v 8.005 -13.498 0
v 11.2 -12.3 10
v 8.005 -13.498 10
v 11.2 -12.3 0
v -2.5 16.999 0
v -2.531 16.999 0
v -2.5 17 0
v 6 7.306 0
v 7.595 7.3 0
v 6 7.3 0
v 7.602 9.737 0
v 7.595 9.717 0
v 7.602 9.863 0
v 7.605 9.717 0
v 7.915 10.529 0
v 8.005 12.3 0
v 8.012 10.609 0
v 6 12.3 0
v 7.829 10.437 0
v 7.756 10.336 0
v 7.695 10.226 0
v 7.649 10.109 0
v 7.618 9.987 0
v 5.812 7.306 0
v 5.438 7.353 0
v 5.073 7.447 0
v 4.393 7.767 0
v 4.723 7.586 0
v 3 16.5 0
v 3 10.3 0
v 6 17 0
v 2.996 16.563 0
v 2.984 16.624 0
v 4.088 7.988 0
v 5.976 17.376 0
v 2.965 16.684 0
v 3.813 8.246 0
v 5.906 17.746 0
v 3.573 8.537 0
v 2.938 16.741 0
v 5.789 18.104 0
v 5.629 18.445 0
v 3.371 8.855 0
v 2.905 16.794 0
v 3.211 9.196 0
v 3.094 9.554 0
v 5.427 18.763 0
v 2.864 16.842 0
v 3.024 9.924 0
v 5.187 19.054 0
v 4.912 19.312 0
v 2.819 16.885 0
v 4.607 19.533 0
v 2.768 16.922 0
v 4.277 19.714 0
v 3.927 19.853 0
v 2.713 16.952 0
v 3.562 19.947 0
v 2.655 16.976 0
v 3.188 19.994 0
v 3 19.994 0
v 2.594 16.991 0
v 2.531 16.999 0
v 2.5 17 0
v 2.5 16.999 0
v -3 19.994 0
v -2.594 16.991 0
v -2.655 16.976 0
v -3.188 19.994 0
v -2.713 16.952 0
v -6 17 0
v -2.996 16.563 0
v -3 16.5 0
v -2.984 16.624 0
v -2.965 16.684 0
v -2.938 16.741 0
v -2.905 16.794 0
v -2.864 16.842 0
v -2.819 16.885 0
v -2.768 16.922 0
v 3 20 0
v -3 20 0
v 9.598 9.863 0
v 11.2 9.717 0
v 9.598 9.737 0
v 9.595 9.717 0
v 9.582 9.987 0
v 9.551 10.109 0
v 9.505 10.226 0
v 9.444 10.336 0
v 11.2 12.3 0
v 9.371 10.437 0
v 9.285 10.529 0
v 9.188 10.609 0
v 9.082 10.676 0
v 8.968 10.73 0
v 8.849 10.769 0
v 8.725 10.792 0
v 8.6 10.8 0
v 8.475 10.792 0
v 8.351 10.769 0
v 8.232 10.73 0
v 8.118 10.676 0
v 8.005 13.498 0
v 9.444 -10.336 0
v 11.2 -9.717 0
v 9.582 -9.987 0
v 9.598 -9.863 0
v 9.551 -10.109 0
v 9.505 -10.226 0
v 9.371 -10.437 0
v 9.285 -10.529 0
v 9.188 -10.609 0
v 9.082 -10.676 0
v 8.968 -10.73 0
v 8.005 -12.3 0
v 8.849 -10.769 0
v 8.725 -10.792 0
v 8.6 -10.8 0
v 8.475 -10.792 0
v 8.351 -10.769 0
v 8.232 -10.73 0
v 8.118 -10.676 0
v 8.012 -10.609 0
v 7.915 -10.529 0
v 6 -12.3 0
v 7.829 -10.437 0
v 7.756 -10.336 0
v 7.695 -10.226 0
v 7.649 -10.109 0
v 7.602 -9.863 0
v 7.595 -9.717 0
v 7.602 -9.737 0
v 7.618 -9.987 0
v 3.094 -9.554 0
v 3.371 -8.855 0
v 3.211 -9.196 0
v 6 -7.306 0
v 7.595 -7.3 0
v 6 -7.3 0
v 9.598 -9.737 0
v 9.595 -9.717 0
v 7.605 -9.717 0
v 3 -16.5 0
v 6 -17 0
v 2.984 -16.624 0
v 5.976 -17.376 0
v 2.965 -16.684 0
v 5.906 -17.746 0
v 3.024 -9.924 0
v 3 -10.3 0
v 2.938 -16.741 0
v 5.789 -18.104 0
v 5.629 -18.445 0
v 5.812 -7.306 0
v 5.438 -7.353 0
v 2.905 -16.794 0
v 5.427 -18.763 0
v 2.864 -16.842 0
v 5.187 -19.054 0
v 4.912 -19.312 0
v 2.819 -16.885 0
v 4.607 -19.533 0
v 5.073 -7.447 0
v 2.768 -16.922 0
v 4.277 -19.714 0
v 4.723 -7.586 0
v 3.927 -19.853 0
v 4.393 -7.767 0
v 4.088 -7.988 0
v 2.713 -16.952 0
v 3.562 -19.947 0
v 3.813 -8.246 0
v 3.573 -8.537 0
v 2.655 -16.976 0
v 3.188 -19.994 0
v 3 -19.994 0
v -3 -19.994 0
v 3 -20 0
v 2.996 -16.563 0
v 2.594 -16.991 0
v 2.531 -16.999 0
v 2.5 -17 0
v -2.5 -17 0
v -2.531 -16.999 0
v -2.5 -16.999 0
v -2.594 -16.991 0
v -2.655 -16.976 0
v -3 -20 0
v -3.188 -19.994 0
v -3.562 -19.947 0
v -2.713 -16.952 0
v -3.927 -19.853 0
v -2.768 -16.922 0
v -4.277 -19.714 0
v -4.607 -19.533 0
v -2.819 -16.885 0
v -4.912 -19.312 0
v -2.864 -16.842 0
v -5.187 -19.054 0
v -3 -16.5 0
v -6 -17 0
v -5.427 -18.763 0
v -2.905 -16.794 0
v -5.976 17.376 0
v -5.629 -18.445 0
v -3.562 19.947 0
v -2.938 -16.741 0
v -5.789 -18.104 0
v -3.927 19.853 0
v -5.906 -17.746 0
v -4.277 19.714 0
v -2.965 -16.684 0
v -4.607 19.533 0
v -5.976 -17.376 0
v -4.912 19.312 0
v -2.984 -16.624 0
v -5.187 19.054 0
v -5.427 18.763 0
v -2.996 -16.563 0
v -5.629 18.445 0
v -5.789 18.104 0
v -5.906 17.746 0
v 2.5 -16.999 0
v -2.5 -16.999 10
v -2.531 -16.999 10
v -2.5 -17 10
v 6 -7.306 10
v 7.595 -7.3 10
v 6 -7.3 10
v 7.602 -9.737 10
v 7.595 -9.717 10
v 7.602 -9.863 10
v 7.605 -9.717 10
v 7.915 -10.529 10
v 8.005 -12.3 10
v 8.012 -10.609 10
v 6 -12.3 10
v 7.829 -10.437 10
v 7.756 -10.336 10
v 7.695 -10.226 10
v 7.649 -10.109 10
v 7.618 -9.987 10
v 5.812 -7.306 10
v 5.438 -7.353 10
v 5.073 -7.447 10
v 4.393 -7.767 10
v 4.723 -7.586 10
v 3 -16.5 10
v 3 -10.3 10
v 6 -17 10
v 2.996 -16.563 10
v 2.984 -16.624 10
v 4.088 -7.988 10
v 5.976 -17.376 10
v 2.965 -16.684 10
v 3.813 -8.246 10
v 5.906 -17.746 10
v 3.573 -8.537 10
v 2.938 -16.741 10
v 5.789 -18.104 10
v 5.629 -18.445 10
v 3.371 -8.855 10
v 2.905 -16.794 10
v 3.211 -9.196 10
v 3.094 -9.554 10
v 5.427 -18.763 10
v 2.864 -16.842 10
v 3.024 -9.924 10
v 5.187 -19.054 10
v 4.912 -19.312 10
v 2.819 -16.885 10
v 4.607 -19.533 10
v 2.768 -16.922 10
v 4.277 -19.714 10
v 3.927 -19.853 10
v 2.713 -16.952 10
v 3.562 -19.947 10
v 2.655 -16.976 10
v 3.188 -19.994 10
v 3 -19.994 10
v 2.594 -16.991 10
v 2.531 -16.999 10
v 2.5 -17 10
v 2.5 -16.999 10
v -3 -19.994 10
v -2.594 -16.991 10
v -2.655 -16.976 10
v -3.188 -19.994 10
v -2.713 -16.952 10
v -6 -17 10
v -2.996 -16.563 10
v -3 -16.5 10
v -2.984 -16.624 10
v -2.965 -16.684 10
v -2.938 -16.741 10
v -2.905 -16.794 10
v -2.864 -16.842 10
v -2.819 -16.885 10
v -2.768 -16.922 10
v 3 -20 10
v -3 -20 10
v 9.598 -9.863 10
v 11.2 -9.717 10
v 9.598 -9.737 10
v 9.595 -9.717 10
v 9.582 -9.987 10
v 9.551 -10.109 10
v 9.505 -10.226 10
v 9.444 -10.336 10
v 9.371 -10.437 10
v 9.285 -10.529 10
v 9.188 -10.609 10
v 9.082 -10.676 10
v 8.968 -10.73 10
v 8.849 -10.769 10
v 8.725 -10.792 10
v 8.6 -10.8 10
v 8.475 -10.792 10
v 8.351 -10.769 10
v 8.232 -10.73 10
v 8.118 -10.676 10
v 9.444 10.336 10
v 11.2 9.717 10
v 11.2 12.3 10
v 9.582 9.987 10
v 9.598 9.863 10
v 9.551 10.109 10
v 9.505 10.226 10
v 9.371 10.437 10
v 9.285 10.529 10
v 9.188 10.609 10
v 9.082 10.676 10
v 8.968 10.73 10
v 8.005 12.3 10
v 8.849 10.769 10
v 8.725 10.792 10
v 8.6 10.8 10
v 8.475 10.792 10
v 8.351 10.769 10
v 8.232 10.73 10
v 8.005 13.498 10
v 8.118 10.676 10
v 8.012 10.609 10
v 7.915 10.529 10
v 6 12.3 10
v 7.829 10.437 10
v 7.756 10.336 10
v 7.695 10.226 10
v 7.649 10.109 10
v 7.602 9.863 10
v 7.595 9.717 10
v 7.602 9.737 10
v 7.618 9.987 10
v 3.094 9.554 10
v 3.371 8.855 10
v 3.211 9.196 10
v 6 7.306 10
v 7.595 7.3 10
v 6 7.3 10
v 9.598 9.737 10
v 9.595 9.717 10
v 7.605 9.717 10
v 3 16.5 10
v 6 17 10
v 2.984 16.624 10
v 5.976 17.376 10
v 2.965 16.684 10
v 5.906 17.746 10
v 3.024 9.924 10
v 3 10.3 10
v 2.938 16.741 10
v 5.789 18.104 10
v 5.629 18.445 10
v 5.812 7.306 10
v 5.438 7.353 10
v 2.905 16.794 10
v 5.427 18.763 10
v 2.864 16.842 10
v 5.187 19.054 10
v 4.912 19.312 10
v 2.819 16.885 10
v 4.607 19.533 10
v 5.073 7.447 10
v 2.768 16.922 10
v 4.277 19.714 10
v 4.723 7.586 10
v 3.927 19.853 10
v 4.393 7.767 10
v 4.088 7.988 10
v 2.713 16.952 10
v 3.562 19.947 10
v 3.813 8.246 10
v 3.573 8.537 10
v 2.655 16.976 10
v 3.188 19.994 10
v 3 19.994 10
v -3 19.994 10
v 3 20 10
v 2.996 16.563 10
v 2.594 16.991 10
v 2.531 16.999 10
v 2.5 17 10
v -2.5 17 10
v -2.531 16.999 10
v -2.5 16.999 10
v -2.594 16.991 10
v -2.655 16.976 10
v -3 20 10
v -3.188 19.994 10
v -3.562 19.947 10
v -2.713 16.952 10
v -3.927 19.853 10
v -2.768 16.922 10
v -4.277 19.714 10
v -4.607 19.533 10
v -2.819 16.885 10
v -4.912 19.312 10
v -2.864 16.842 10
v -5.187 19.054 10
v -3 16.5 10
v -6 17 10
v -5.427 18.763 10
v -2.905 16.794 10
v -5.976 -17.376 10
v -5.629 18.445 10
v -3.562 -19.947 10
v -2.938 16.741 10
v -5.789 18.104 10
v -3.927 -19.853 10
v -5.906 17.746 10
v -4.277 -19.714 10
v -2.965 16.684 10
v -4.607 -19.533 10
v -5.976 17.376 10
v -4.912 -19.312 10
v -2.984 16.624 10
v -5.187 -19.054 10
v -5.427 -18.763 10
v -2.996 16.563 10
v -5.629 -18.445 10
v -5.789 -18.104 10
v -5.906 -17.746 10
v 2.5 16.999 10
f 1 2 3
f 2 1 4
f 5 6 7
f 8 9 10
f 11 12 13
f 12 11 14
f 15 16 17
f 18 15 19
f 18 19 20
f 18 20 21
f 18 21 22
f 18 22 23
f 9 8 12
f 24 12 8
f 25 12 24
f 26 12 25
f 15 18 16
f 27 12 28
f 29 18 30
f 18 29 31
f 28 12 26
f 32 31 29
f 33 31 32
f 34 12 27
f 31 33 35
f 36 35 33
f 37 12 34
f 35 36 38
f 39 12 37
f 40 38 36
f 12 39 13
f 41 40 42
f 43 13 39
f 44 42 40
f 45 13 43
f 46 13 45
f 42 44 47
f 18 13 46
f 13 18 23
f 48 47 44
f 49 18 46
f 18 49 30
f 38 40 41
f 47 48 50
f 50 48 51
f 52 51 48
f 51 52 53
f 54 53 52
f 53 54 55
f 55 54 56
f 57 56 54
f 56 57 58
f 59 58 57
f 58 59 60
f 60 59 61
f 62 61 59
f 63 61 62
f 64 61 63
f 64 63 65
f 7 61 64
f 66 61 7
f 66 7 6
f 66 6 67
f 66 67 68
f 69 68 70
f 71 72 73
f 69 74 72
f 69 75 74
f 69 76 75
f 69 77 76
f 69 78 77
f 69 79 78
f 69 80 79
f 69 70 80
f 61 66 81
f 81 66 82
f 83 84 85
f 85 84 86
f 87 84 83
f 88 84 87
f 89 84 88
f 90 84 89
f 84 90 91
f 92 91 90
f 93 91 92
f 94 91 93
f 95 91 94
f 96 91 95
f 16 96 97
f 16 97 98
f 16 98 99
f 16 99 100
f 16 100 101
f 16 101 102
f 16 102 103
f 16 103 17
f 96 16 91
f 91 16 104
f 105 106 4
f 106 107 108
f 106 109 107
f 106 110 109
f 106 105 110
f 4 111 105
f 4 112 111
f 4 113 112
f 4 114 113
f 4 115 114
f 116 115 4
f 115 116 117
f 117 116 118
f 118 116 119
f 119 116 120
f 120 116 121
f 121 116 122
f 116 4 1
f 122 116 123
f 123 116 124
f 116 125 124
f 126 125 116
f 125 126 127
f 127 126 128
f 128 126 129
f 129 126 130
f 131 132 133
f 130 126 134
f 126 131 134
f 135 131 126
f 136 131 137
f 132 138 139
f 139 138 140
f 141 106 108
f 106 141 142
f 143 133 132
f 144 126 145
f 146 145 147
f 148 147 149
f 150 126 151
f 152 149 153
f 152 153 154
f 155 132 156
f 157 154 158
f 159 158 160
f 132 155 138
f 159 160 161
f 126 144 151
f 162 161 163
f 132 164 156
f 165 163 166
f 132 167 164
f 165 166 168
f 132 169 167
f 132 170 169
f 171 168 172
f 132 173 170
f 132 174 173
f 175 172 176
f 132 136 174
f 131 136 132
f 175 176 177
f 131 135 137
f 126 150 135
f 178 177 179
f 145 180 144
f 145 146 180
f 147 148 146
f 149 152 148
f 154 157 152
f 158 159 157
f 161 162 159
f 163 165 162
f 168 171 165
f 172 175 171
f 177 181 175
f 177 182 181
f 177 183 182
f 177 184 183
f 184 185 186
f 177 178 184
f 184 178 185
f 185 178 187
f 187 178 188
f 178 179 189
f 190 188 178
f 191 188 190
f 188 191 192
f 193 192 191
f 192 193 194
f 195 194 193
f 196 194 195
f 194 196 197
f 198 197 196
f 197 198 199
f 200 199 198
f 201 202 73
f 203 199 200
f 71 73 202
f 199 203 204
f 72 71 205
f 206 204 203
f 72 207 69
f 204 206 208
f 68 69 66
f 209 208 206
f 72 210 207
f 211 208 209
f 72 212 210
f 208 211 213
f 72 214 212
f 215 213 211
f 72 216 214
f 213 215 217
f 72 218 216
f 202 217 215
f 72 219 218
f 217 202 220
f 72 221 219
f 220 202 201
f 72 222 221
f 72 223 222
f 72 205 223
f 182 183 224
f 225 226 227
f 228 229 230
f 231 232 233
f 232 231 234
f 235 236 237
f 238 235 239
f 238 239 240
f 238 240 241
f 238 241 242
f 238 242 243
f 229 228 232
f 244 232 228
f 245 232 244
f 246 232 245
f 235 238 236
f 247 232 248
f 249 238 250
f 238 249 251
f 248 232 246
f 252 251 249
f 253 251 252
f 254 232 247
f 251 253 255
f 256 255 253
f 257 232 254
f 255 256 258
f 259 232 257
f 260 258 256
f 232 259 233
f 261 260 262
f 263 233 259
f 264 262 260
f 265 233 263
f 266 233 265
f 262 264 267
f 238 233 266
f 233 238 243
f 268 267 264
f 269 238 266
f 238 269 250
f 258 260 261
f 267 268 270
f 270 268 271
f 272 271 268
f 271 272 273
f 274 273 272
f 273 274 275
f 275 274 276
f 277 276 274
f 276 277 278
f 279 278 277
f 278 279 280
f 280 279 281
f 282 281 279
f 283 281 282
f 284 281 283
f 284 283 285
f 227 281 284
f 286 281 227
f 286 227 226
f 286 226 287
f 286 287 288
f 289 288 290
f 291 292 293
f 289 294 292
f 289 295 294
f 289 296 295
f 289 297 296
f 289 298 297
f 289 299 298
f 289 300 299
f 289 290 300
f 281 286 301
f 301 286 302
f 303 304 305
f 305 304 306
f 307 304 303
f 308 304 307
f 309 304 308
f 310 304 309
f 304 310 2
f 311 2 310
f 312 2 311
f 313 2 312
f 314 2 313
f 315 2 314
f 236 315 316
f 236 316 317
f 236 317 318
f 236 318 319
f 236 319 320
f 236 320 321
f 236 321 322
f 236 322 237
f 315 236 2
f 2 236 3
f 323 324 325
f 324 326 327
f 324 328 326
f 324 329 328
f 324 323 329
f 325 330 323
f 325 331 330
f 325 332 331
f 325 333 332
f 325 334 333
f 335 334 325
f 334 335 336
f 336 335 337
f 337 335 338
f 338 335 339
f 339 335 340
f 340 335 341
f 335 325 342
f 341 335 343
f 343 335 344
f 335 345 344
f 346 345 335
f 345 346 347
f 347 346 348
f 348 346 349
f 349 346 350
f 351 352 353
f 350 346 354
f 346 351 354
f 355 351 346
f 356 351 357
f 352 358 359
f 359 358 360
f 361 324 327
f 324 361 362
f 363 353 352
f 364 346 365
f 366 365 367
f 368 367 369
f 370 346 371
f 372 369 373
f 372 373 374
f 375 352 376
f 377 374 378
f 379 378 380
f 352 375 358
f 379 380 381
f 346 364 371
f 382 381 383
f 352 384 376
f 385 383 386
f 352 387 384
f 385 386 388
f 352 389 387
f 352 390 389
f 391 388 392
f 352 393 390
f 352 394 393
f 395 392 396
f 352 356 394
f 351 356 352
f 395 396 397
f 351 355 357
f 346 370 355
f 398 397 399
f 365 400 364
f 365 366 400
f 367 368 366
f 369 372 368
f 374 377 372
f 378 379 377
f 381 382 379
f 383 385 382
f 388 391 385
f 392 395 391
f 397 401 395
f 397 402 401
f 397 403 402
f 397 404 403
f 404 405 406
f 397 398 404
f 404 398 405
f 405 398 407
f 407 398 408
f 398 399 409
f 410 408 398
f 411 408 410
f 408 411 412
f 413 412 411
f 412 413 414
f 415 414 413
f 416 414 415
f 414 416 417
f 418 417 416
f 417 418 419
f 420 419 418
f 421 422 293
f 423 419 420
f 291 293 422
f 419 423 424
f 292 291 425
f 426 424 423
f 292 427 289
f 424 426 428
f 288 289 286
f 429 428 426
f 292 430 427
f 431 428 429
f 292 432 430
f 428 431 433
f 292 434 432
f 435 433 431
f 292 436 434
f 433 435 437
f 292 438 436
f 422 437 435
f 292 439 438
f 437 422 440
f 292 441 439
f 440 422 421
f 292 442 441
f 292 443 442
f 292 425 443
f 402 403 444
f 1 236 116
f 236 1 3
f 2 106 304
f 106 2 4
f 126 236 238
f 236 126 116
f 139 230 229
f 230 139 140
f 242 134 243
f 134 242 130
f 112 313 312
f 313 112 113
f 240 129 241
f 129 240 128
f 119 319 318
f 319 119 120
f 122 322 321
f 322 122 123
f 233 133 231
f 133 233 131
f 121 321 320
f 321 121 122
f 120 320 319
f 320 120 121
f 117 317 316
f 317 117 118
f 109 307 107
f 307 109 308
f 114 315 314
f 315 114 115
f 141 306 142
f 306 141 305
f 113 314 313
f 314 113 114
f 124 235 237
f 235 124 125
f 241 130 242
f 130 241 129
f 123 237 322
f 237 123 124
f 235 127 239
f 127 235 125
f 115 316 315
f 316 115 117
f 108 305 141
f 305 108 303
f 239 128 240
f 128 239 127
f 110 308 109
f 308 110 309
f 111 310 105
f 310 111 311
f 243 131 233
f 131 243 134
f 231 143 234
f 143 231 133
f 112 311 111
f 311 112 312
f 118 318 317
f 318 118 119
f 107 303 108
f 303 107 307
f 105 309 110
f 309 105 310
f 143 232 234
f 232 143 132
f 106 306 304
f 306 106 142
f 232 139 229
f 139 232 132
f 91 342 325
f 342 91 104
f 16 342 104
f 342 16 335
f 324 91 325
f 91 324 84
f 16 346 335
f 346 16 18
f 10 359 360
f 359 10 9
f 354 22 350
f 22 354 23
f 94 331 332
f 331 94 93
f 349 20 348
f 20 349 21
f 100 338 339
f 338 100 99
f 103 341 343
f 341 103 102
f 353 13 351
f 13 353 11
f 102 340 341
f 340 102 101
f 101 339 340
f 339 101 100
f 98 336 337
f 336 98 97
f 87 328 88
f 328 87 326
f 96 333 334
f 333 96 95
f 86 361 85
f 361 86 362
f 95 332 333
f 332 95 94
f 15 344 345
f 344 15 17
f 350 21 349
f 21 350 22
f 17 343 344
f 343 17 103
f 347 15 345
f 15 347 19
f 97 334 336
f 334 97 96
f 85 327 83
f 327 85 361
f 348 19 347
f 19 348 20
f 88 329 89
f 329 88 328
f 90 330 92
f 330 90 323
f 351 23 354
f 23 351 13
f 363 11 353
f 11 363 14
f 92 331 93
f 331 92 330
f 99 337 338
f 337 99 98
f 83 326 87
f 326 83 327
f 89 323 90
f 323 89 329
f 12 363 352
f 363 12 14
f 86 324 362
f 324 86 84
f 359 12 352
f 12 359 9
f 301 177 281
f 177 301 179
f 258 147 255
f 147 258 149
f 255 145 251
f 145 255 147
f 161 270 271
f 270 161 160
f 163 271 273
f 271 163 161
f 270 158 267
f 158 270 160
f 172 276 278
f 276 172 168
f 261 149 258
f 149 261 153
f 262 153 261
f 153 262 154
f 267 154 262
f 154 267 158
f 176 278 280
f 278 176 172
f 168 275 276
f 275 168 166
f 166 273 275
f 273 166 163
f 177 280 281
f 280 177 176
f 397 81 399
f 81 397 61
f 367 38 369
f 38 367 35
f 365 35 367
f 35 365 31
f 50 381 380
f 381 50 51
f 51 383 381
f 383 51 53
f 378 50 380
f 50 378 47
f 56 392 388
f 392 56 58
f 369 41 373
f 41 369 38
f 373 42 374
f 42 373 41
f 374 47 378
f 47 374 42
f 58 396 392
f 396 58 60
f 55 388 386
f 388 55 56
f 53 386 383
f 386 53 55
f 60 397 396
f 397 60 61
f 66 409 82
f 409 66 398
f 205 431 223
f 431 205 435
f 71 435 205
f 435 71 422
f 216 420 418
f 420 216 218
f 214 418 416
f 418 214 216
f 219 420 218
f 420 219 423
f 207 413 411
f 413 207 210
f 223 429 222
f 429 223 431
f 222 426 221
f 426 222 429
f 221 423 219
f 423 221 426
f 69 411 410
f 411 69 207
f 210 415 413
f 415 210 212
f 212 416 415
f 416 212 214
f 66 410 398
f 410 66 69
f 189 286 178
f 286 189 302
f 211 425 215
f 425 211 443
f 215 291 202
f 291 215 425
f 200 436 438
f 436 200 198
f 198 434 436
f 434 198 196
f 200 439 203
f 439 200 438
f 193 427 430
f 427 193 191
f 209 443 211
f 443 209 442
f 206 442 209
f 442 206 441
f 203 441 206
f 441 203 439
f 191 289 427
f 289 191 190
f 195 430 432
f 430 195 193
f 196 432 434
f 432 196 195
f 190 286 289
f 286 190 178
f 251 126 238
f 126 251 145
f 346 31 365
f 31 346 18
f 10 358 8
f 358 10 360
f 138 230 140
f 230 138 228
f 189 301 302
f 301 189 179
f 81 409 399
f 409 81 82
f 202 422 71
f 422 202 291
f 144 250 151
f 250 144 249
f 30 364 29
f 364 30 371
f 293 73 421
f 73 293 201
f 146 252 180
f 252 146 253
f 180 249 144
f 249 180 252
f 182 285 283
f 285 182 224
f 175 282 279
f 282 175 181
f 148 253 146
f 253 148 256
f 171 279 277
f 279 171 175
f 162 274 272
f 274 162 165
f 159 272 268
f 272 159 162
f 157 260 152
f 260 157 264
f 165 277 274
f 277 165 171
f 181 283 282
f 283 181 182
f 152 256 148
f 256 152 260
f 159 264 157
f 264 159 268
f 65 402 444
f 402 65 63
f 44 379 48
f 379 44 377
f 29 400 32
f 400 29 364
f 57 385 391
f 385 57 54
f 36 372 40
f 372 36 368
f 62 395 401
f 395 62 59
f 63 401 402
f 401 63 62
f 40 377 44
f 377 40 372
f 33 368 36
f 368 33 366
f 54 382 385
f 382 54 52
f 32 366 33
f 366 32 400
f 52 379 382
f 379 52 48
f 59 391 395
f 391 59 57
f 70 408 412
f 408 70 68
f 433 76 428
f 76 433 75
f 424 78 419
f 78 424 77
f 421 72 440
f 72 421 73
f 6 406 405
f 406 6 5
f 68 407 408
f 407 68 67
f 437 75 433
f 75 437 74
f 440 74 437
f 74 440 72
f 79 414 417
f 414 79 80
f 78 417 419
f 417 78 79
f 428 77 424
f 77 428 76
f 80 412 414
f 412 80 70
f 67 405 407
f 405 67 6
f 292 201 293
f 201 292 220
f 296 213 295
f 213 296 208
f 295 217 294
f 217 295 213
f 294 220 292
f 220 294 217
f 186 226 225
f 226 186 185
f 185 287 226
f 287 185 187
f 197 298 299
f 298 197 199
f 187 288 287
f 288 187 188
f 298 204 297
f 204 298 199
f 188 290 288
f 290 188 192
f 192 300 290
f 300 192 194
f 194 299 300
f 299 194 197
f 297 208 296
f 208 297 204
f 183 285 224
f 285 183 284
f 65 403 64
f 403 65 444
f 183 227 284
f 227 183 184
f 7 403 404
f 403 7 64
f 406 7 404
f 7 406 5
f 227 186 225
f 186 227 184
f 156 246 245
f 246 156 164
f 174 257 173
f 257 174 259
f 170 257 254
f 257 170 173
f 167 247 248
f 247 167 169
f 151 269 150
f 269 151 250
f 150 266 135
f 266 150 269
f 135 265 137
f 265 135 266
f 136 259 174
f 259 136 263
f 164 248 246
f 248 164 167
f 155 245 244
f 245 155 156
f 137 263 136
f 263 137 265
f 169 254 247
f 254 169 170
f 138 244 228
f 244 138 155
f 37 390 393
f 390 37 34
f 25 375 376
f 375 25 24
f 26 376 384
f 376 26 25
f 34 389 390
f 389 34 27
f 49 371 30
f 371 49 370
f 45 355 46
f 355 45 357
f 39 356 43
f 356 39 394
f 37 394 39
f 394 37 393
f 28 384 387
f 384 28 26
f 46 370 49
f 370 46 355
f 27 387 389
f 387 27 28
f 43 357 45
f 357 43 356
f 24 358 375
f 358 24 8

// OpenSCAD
height1 = 40; // How far does the part stretch over the extrusion.
depth1 = 12; // The distance from the extrusion surface to the outer edge of the channel.
width = 10; // The width of the clip.
channel_gap = 14.60; // The distance between the inner edges of the channels in the extrusion.
channel_depth = 5.2; // The depth of the channels.
channel_width = 5.0; // The width of the channels.
thickness = 3; // The thickness of the clip.
clip_dist = 1.2; // The distance by which the clip extends beyond the entry width of the channel.
clip_over_t = 2; // The thickness of the narrowing of the channels.
tol01 = 0.01; // A small value to avoid coincident surfaces causing rendering problems.
snapIn = true; // If True then you can clip the part into the extrusion. If False you'll probably have to slide it into the extrusion while constructing your project

height = height1<(2*channel_width + channel_gap +clip_dist*2) ? 2*channel_width + channel_gap +clip_dist*2 : height1 ; // ensure the height is not less than required to provide a lip over the edge of each channel

depth = depth1<(2*thickness+5) ? 2*thickness+5 : depth1 ;

feature_dia = (height-channel_gap-channel_width*2)/2<(depth-thickness*2)/2 ? (height-channel_gap-channel_width*2)/2 : (depth-thickness*2)/2 ;

feature_dia_inner = (feature_dia-channel_width/2)<0 ?  0 : feature_dia-channel_width/2 ;

module holder(){
    difference(){
        cube([depth,width,height],center=true);
        translate([0,0,0]) cube([depth-thickness*2,width+tol01,height-depth],center=true);
        translate([thickness/2+tol01/2,0,0]) cube([depth-thickness+tol01,width+tol01,channel_gap],center=true);      
        translate([depth/2-feature_dia,0,height/2-feature_dia]) difference(){
            translate([(feature_dia+tol01)/2,0,+feature_dia/2+tol01/2]) cube([feature_dia+tol01,width+tol01,feature_dia+tol01],center=true);
            translate([0,0,0]) rotate([90,0,0]) cylinder(h=width+tol01*2,d=feature_dia*2,$fn=50,center=true);
        }
        scale([1,1,-1]) translate([depth/2-feature_dia,0,height/2-feature_dia]) difference(){
            translate([(feature_dia+tol01)/2,0,+feature_dia/2+tol01/2]) cube([feature_dia+tol01,width+tol01,feature_dia+tol01],center=true);
            translate([0,0,0]) rotate([90,0,0]) cylinder(h=width+tol01*2,d=feature_dia*2,$fn=50,center=true);
        }        
        scale([-1,1,-1]) translate([depth/2-feature_dia,0,height/2-feature_dia]) difference(){
            translate([(feature_dia+tol01)/2,0,+feature_dia/2+tol01/2]) cube([feature_dia+tol01,width+tol01,feature_dia+tol01],center=true);
            translate([0,0,0]) rotate([90,0,0]) cylinder(h=width+tol01*2,d=feature_dia*2,$fn=50,center=true);
        }
        scale([-1,1,1]) translate([depth/2-feature_dia,0,height/2-feature_dia]) difference(){
            translate([(feature_dia+tol01)/2,0,+feature_dia/2+tol01/2]) cube([feature_dia+tol01,width+tol01,feature_dia+tol01],center=true);
            translate([0,0,0]) rotate([90,0,0]) cylinder(h=width+tol01*2,d=feature_dia*2,$fn=50,center=true);
        }
        translate([depth/2-thickness-feature_dia_inner,0,height/2-thickness-feature_dia_inner]) rotate([90,0,0]) cylinder(h=width+tol01,d=feature_dia_inner*2,$fn=50,center=true);
        scale([1,1,-1]) translate([depth/2-thickness-feature_dia_inner,0,height/2-thickness-feature_dia_inner]) rotate([90,0,0]) cylinder(h=width+tol01,d=feature_dia_inner*2,$fn=50,center=true);
        scale([-1,1,-1]) translate([depth/2-thickness-feature_dia_inner,0,height/2-thickness-feature_dia_inner]) rotate([90,0,0]) cylinder(h=width+tol01,d=feature_dia_inner*2,$fn=50,center=true);
        scale([-1,1,1]) translate([depth/2-thickness-feature_dia_inner,0,height/2-thickness-feature_dia_inner]) rotate([90,0,0]) cylinder(h=width+tol01,d=feature_dia_inner*2,$fn=50,center=true);
        cube([depth-thickness*2,width+tol01,height-(thickness+feature_dia_inner)*2],center=true);
        cube([depth-(feature_dia_inner+thickness)*2,width+tol01,height-thickness*2],center=true);
    }
}

module clip(){
    difference(){
        union(){
            translate([-thickness/2,0,0]) cube([channel_depth+thickness,width,channel_width],center=true);
            difference(){
                translate([-channel_depth/2+clip_over_t,0,channel_width/2]) rotate([90,0,0]) scale([channel_depth-clip_over_t,clip_dist,1]) cylinder(h=width,d=2,$fn=4,center=true);
                translate([-(channel_depth-clip_over_t)/2-channel_depth/2+clip_over_t,0,channel_width/2]) cube([channel_depth-clip_over_t+tol01,width+tol01,clip_dist*2+tol01],center=true);
            }
            difference(){
                translate([-channel_depth/2+clip_over_t,0,-channel_width/2]) rotate([90,0,0]) scale([channel_depth-clip_over_t,clip_dist,1]) cylinder(h=width,d=2,$fn=4,center=true);
                translate([-(channel_depth-clip_over_t)/2-channel_depth/2+clip_over_t,0,-channel_width/2]) cube([channel_depth-clip_over_t+tol01,width+tol01,clip_dist*2+tol01],center=true);
            }
        }
        rotate([0,90,90]) cylinder(h=width+tol01,d=channel_width/2.5,$fn=50,center=true);
        translate([channel_depth/2,0,0]) cube([channel_depth+tol01,width+tol01,channel_width/2.5],center=true);
    }
}

module clip2(){
    difference(){
        union(){
            translate([-thickness/2,0,0]) cube([channel_depth+thickness,width,channel_width],center=true);
            difference(){
                translate([-channel_depth/2+clip_over_t,0,channel_width/2]) rotate([90,0,0]) scale([channel_depth-clip_over_t,clip_dist,1]) cylinder(h=width,d=2,$fn=4,center=true);
                translate([-(channel_depth-clip_over_t)/2-channel_depth/2+clip_over_t,0,channel_width/2]) cube([channel_depth-clip_over_t+tol01,width+tol01,clip_dist*2+tol01],center=true);
            }
        }
        rotate([0,90,90]) cylinder(h=width+tol01,d=channel_width/2.5,$fn=50,center=true);
        translate([channel_depth/2,0,-channel_width/3.75]) cube([channel_depth+tol01+channel_width/2.5,width+tol01,channel_width/2],center=true);
    }
}

module assembly(){
    difference(){
        union(){
            translate([depth/2+channel_depth/2,0,channel_width/2+channel_gap/2]) clip2();
            translate([depth/2+channel_depth/2,0,-channel_width/2-channel_gap/2]) rotate([180,0,0]) clip2();
            holder();
        }
    difference(){
                translate([depth/2-thickness*.5-tol01/2,0,channel_gap/2+thickness/2-tol01/2]) cube([thickness+tol01,width+tol01,thickness+tol01],center=true);
                translate([depth/2,0,channel_gap/2+thickness]) rotate([90,0,0]) cylinder(h=width+tol01*2,d=thickness*2,$fn=50,center=true);
            }
    difference(){
                translate([depth/2-thickness*.5-tol01/2,0,-channel_gap/2-thickness/2+tol01/2]) cube([thickness+tol01,width+tol01,thickness+tol01],center=true);
                translate([depth/2,0,-channel_gap/2-thickness]) rotate([90,0,0]) cylinder(h=width+tol01*2,d=thickness*2,$fn=50,center=true);
        }
    }
}

translate([0,0,width/2]) rotate([90,0,0]) assembly();
